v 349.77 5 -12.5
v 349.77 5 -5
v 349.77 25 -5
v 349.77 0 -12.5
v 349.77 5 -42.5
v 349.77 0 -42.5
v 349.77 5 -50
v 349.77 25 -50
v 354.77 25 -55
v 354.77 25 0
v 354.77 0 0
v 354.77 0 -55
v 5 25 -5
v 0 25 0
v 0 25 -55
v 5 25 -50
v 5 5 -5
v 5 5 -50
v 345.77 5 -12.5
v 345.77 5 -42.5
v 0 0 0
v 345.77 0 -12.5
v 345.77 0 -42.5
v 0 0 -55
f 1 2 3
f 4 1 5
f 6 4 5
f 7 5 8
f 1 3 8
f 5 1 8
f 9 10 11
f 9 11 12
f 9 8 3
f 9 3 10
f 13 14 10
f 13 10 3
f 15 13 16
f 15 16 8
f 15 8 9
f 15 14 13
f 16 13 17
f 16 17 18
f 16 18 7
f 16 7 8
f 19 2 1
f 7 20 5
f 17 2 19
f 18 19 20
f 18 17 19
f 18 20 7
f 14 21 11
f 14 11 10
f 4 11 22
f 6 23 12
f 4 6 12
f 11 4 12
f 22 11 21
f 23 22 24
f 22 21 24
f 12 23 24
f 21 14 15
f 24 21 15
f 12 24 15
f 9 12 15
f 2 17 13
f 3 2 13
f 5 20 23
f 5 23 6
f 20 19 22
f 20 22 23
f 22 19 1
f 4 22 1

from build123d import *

# Parameters (mm, degrees)
ESBO_O1_W                = 55
ESBO_O1_H                = 25
RESSALTO_EXTRUS_O1_DEPTH = 354.77
CASCA1_T                 = -5
ESBO_O3_W                = 4
ESBO_O3_H                = 30
CORTE_EXTRUS_O1_DEPTH    = 360.564671374


with BuildPart() as part:
    # Esboço1 → Ressalto-extrusão1 (new body)
    with BuildSketch(Plane(origin=(0, 0, 0), x_dir=(0, 0, -1), z_dir=(1, 0, 0))):
        with Locations((27.5, 12.5)):
            Rectangle(ESBO_O1_W, ESBO_O1_H)
    extrude(amount=RESSALTO_EXTRUS_O1_DEPTH)

    # Casca1
    casca1_openings = [part.faces().sort_by_distance(p)[0] for p in [
        (177.385, 25, -27.5),
    ]]
    offset(amount=CASCA1_T, openings=casca1_openings, kind=Kind.INTERSECTION)

    # Esboço3 → Corte-extrusão1 (cut, through all)
    with BuildSketch(Plane(origin=(0, 5, 0), x_dir=(1, 0, 0), z_dir=(0, 1, 0))):
        with Locations((347.77, 27.5)):
            Rectangle(ESBO_O3_W, ESBO_O3_H)
    extrude(amount=-CORTE_EXTRUS_O1_DEPTH, mode=Mode.SUBTRACT)


solid = part.part
